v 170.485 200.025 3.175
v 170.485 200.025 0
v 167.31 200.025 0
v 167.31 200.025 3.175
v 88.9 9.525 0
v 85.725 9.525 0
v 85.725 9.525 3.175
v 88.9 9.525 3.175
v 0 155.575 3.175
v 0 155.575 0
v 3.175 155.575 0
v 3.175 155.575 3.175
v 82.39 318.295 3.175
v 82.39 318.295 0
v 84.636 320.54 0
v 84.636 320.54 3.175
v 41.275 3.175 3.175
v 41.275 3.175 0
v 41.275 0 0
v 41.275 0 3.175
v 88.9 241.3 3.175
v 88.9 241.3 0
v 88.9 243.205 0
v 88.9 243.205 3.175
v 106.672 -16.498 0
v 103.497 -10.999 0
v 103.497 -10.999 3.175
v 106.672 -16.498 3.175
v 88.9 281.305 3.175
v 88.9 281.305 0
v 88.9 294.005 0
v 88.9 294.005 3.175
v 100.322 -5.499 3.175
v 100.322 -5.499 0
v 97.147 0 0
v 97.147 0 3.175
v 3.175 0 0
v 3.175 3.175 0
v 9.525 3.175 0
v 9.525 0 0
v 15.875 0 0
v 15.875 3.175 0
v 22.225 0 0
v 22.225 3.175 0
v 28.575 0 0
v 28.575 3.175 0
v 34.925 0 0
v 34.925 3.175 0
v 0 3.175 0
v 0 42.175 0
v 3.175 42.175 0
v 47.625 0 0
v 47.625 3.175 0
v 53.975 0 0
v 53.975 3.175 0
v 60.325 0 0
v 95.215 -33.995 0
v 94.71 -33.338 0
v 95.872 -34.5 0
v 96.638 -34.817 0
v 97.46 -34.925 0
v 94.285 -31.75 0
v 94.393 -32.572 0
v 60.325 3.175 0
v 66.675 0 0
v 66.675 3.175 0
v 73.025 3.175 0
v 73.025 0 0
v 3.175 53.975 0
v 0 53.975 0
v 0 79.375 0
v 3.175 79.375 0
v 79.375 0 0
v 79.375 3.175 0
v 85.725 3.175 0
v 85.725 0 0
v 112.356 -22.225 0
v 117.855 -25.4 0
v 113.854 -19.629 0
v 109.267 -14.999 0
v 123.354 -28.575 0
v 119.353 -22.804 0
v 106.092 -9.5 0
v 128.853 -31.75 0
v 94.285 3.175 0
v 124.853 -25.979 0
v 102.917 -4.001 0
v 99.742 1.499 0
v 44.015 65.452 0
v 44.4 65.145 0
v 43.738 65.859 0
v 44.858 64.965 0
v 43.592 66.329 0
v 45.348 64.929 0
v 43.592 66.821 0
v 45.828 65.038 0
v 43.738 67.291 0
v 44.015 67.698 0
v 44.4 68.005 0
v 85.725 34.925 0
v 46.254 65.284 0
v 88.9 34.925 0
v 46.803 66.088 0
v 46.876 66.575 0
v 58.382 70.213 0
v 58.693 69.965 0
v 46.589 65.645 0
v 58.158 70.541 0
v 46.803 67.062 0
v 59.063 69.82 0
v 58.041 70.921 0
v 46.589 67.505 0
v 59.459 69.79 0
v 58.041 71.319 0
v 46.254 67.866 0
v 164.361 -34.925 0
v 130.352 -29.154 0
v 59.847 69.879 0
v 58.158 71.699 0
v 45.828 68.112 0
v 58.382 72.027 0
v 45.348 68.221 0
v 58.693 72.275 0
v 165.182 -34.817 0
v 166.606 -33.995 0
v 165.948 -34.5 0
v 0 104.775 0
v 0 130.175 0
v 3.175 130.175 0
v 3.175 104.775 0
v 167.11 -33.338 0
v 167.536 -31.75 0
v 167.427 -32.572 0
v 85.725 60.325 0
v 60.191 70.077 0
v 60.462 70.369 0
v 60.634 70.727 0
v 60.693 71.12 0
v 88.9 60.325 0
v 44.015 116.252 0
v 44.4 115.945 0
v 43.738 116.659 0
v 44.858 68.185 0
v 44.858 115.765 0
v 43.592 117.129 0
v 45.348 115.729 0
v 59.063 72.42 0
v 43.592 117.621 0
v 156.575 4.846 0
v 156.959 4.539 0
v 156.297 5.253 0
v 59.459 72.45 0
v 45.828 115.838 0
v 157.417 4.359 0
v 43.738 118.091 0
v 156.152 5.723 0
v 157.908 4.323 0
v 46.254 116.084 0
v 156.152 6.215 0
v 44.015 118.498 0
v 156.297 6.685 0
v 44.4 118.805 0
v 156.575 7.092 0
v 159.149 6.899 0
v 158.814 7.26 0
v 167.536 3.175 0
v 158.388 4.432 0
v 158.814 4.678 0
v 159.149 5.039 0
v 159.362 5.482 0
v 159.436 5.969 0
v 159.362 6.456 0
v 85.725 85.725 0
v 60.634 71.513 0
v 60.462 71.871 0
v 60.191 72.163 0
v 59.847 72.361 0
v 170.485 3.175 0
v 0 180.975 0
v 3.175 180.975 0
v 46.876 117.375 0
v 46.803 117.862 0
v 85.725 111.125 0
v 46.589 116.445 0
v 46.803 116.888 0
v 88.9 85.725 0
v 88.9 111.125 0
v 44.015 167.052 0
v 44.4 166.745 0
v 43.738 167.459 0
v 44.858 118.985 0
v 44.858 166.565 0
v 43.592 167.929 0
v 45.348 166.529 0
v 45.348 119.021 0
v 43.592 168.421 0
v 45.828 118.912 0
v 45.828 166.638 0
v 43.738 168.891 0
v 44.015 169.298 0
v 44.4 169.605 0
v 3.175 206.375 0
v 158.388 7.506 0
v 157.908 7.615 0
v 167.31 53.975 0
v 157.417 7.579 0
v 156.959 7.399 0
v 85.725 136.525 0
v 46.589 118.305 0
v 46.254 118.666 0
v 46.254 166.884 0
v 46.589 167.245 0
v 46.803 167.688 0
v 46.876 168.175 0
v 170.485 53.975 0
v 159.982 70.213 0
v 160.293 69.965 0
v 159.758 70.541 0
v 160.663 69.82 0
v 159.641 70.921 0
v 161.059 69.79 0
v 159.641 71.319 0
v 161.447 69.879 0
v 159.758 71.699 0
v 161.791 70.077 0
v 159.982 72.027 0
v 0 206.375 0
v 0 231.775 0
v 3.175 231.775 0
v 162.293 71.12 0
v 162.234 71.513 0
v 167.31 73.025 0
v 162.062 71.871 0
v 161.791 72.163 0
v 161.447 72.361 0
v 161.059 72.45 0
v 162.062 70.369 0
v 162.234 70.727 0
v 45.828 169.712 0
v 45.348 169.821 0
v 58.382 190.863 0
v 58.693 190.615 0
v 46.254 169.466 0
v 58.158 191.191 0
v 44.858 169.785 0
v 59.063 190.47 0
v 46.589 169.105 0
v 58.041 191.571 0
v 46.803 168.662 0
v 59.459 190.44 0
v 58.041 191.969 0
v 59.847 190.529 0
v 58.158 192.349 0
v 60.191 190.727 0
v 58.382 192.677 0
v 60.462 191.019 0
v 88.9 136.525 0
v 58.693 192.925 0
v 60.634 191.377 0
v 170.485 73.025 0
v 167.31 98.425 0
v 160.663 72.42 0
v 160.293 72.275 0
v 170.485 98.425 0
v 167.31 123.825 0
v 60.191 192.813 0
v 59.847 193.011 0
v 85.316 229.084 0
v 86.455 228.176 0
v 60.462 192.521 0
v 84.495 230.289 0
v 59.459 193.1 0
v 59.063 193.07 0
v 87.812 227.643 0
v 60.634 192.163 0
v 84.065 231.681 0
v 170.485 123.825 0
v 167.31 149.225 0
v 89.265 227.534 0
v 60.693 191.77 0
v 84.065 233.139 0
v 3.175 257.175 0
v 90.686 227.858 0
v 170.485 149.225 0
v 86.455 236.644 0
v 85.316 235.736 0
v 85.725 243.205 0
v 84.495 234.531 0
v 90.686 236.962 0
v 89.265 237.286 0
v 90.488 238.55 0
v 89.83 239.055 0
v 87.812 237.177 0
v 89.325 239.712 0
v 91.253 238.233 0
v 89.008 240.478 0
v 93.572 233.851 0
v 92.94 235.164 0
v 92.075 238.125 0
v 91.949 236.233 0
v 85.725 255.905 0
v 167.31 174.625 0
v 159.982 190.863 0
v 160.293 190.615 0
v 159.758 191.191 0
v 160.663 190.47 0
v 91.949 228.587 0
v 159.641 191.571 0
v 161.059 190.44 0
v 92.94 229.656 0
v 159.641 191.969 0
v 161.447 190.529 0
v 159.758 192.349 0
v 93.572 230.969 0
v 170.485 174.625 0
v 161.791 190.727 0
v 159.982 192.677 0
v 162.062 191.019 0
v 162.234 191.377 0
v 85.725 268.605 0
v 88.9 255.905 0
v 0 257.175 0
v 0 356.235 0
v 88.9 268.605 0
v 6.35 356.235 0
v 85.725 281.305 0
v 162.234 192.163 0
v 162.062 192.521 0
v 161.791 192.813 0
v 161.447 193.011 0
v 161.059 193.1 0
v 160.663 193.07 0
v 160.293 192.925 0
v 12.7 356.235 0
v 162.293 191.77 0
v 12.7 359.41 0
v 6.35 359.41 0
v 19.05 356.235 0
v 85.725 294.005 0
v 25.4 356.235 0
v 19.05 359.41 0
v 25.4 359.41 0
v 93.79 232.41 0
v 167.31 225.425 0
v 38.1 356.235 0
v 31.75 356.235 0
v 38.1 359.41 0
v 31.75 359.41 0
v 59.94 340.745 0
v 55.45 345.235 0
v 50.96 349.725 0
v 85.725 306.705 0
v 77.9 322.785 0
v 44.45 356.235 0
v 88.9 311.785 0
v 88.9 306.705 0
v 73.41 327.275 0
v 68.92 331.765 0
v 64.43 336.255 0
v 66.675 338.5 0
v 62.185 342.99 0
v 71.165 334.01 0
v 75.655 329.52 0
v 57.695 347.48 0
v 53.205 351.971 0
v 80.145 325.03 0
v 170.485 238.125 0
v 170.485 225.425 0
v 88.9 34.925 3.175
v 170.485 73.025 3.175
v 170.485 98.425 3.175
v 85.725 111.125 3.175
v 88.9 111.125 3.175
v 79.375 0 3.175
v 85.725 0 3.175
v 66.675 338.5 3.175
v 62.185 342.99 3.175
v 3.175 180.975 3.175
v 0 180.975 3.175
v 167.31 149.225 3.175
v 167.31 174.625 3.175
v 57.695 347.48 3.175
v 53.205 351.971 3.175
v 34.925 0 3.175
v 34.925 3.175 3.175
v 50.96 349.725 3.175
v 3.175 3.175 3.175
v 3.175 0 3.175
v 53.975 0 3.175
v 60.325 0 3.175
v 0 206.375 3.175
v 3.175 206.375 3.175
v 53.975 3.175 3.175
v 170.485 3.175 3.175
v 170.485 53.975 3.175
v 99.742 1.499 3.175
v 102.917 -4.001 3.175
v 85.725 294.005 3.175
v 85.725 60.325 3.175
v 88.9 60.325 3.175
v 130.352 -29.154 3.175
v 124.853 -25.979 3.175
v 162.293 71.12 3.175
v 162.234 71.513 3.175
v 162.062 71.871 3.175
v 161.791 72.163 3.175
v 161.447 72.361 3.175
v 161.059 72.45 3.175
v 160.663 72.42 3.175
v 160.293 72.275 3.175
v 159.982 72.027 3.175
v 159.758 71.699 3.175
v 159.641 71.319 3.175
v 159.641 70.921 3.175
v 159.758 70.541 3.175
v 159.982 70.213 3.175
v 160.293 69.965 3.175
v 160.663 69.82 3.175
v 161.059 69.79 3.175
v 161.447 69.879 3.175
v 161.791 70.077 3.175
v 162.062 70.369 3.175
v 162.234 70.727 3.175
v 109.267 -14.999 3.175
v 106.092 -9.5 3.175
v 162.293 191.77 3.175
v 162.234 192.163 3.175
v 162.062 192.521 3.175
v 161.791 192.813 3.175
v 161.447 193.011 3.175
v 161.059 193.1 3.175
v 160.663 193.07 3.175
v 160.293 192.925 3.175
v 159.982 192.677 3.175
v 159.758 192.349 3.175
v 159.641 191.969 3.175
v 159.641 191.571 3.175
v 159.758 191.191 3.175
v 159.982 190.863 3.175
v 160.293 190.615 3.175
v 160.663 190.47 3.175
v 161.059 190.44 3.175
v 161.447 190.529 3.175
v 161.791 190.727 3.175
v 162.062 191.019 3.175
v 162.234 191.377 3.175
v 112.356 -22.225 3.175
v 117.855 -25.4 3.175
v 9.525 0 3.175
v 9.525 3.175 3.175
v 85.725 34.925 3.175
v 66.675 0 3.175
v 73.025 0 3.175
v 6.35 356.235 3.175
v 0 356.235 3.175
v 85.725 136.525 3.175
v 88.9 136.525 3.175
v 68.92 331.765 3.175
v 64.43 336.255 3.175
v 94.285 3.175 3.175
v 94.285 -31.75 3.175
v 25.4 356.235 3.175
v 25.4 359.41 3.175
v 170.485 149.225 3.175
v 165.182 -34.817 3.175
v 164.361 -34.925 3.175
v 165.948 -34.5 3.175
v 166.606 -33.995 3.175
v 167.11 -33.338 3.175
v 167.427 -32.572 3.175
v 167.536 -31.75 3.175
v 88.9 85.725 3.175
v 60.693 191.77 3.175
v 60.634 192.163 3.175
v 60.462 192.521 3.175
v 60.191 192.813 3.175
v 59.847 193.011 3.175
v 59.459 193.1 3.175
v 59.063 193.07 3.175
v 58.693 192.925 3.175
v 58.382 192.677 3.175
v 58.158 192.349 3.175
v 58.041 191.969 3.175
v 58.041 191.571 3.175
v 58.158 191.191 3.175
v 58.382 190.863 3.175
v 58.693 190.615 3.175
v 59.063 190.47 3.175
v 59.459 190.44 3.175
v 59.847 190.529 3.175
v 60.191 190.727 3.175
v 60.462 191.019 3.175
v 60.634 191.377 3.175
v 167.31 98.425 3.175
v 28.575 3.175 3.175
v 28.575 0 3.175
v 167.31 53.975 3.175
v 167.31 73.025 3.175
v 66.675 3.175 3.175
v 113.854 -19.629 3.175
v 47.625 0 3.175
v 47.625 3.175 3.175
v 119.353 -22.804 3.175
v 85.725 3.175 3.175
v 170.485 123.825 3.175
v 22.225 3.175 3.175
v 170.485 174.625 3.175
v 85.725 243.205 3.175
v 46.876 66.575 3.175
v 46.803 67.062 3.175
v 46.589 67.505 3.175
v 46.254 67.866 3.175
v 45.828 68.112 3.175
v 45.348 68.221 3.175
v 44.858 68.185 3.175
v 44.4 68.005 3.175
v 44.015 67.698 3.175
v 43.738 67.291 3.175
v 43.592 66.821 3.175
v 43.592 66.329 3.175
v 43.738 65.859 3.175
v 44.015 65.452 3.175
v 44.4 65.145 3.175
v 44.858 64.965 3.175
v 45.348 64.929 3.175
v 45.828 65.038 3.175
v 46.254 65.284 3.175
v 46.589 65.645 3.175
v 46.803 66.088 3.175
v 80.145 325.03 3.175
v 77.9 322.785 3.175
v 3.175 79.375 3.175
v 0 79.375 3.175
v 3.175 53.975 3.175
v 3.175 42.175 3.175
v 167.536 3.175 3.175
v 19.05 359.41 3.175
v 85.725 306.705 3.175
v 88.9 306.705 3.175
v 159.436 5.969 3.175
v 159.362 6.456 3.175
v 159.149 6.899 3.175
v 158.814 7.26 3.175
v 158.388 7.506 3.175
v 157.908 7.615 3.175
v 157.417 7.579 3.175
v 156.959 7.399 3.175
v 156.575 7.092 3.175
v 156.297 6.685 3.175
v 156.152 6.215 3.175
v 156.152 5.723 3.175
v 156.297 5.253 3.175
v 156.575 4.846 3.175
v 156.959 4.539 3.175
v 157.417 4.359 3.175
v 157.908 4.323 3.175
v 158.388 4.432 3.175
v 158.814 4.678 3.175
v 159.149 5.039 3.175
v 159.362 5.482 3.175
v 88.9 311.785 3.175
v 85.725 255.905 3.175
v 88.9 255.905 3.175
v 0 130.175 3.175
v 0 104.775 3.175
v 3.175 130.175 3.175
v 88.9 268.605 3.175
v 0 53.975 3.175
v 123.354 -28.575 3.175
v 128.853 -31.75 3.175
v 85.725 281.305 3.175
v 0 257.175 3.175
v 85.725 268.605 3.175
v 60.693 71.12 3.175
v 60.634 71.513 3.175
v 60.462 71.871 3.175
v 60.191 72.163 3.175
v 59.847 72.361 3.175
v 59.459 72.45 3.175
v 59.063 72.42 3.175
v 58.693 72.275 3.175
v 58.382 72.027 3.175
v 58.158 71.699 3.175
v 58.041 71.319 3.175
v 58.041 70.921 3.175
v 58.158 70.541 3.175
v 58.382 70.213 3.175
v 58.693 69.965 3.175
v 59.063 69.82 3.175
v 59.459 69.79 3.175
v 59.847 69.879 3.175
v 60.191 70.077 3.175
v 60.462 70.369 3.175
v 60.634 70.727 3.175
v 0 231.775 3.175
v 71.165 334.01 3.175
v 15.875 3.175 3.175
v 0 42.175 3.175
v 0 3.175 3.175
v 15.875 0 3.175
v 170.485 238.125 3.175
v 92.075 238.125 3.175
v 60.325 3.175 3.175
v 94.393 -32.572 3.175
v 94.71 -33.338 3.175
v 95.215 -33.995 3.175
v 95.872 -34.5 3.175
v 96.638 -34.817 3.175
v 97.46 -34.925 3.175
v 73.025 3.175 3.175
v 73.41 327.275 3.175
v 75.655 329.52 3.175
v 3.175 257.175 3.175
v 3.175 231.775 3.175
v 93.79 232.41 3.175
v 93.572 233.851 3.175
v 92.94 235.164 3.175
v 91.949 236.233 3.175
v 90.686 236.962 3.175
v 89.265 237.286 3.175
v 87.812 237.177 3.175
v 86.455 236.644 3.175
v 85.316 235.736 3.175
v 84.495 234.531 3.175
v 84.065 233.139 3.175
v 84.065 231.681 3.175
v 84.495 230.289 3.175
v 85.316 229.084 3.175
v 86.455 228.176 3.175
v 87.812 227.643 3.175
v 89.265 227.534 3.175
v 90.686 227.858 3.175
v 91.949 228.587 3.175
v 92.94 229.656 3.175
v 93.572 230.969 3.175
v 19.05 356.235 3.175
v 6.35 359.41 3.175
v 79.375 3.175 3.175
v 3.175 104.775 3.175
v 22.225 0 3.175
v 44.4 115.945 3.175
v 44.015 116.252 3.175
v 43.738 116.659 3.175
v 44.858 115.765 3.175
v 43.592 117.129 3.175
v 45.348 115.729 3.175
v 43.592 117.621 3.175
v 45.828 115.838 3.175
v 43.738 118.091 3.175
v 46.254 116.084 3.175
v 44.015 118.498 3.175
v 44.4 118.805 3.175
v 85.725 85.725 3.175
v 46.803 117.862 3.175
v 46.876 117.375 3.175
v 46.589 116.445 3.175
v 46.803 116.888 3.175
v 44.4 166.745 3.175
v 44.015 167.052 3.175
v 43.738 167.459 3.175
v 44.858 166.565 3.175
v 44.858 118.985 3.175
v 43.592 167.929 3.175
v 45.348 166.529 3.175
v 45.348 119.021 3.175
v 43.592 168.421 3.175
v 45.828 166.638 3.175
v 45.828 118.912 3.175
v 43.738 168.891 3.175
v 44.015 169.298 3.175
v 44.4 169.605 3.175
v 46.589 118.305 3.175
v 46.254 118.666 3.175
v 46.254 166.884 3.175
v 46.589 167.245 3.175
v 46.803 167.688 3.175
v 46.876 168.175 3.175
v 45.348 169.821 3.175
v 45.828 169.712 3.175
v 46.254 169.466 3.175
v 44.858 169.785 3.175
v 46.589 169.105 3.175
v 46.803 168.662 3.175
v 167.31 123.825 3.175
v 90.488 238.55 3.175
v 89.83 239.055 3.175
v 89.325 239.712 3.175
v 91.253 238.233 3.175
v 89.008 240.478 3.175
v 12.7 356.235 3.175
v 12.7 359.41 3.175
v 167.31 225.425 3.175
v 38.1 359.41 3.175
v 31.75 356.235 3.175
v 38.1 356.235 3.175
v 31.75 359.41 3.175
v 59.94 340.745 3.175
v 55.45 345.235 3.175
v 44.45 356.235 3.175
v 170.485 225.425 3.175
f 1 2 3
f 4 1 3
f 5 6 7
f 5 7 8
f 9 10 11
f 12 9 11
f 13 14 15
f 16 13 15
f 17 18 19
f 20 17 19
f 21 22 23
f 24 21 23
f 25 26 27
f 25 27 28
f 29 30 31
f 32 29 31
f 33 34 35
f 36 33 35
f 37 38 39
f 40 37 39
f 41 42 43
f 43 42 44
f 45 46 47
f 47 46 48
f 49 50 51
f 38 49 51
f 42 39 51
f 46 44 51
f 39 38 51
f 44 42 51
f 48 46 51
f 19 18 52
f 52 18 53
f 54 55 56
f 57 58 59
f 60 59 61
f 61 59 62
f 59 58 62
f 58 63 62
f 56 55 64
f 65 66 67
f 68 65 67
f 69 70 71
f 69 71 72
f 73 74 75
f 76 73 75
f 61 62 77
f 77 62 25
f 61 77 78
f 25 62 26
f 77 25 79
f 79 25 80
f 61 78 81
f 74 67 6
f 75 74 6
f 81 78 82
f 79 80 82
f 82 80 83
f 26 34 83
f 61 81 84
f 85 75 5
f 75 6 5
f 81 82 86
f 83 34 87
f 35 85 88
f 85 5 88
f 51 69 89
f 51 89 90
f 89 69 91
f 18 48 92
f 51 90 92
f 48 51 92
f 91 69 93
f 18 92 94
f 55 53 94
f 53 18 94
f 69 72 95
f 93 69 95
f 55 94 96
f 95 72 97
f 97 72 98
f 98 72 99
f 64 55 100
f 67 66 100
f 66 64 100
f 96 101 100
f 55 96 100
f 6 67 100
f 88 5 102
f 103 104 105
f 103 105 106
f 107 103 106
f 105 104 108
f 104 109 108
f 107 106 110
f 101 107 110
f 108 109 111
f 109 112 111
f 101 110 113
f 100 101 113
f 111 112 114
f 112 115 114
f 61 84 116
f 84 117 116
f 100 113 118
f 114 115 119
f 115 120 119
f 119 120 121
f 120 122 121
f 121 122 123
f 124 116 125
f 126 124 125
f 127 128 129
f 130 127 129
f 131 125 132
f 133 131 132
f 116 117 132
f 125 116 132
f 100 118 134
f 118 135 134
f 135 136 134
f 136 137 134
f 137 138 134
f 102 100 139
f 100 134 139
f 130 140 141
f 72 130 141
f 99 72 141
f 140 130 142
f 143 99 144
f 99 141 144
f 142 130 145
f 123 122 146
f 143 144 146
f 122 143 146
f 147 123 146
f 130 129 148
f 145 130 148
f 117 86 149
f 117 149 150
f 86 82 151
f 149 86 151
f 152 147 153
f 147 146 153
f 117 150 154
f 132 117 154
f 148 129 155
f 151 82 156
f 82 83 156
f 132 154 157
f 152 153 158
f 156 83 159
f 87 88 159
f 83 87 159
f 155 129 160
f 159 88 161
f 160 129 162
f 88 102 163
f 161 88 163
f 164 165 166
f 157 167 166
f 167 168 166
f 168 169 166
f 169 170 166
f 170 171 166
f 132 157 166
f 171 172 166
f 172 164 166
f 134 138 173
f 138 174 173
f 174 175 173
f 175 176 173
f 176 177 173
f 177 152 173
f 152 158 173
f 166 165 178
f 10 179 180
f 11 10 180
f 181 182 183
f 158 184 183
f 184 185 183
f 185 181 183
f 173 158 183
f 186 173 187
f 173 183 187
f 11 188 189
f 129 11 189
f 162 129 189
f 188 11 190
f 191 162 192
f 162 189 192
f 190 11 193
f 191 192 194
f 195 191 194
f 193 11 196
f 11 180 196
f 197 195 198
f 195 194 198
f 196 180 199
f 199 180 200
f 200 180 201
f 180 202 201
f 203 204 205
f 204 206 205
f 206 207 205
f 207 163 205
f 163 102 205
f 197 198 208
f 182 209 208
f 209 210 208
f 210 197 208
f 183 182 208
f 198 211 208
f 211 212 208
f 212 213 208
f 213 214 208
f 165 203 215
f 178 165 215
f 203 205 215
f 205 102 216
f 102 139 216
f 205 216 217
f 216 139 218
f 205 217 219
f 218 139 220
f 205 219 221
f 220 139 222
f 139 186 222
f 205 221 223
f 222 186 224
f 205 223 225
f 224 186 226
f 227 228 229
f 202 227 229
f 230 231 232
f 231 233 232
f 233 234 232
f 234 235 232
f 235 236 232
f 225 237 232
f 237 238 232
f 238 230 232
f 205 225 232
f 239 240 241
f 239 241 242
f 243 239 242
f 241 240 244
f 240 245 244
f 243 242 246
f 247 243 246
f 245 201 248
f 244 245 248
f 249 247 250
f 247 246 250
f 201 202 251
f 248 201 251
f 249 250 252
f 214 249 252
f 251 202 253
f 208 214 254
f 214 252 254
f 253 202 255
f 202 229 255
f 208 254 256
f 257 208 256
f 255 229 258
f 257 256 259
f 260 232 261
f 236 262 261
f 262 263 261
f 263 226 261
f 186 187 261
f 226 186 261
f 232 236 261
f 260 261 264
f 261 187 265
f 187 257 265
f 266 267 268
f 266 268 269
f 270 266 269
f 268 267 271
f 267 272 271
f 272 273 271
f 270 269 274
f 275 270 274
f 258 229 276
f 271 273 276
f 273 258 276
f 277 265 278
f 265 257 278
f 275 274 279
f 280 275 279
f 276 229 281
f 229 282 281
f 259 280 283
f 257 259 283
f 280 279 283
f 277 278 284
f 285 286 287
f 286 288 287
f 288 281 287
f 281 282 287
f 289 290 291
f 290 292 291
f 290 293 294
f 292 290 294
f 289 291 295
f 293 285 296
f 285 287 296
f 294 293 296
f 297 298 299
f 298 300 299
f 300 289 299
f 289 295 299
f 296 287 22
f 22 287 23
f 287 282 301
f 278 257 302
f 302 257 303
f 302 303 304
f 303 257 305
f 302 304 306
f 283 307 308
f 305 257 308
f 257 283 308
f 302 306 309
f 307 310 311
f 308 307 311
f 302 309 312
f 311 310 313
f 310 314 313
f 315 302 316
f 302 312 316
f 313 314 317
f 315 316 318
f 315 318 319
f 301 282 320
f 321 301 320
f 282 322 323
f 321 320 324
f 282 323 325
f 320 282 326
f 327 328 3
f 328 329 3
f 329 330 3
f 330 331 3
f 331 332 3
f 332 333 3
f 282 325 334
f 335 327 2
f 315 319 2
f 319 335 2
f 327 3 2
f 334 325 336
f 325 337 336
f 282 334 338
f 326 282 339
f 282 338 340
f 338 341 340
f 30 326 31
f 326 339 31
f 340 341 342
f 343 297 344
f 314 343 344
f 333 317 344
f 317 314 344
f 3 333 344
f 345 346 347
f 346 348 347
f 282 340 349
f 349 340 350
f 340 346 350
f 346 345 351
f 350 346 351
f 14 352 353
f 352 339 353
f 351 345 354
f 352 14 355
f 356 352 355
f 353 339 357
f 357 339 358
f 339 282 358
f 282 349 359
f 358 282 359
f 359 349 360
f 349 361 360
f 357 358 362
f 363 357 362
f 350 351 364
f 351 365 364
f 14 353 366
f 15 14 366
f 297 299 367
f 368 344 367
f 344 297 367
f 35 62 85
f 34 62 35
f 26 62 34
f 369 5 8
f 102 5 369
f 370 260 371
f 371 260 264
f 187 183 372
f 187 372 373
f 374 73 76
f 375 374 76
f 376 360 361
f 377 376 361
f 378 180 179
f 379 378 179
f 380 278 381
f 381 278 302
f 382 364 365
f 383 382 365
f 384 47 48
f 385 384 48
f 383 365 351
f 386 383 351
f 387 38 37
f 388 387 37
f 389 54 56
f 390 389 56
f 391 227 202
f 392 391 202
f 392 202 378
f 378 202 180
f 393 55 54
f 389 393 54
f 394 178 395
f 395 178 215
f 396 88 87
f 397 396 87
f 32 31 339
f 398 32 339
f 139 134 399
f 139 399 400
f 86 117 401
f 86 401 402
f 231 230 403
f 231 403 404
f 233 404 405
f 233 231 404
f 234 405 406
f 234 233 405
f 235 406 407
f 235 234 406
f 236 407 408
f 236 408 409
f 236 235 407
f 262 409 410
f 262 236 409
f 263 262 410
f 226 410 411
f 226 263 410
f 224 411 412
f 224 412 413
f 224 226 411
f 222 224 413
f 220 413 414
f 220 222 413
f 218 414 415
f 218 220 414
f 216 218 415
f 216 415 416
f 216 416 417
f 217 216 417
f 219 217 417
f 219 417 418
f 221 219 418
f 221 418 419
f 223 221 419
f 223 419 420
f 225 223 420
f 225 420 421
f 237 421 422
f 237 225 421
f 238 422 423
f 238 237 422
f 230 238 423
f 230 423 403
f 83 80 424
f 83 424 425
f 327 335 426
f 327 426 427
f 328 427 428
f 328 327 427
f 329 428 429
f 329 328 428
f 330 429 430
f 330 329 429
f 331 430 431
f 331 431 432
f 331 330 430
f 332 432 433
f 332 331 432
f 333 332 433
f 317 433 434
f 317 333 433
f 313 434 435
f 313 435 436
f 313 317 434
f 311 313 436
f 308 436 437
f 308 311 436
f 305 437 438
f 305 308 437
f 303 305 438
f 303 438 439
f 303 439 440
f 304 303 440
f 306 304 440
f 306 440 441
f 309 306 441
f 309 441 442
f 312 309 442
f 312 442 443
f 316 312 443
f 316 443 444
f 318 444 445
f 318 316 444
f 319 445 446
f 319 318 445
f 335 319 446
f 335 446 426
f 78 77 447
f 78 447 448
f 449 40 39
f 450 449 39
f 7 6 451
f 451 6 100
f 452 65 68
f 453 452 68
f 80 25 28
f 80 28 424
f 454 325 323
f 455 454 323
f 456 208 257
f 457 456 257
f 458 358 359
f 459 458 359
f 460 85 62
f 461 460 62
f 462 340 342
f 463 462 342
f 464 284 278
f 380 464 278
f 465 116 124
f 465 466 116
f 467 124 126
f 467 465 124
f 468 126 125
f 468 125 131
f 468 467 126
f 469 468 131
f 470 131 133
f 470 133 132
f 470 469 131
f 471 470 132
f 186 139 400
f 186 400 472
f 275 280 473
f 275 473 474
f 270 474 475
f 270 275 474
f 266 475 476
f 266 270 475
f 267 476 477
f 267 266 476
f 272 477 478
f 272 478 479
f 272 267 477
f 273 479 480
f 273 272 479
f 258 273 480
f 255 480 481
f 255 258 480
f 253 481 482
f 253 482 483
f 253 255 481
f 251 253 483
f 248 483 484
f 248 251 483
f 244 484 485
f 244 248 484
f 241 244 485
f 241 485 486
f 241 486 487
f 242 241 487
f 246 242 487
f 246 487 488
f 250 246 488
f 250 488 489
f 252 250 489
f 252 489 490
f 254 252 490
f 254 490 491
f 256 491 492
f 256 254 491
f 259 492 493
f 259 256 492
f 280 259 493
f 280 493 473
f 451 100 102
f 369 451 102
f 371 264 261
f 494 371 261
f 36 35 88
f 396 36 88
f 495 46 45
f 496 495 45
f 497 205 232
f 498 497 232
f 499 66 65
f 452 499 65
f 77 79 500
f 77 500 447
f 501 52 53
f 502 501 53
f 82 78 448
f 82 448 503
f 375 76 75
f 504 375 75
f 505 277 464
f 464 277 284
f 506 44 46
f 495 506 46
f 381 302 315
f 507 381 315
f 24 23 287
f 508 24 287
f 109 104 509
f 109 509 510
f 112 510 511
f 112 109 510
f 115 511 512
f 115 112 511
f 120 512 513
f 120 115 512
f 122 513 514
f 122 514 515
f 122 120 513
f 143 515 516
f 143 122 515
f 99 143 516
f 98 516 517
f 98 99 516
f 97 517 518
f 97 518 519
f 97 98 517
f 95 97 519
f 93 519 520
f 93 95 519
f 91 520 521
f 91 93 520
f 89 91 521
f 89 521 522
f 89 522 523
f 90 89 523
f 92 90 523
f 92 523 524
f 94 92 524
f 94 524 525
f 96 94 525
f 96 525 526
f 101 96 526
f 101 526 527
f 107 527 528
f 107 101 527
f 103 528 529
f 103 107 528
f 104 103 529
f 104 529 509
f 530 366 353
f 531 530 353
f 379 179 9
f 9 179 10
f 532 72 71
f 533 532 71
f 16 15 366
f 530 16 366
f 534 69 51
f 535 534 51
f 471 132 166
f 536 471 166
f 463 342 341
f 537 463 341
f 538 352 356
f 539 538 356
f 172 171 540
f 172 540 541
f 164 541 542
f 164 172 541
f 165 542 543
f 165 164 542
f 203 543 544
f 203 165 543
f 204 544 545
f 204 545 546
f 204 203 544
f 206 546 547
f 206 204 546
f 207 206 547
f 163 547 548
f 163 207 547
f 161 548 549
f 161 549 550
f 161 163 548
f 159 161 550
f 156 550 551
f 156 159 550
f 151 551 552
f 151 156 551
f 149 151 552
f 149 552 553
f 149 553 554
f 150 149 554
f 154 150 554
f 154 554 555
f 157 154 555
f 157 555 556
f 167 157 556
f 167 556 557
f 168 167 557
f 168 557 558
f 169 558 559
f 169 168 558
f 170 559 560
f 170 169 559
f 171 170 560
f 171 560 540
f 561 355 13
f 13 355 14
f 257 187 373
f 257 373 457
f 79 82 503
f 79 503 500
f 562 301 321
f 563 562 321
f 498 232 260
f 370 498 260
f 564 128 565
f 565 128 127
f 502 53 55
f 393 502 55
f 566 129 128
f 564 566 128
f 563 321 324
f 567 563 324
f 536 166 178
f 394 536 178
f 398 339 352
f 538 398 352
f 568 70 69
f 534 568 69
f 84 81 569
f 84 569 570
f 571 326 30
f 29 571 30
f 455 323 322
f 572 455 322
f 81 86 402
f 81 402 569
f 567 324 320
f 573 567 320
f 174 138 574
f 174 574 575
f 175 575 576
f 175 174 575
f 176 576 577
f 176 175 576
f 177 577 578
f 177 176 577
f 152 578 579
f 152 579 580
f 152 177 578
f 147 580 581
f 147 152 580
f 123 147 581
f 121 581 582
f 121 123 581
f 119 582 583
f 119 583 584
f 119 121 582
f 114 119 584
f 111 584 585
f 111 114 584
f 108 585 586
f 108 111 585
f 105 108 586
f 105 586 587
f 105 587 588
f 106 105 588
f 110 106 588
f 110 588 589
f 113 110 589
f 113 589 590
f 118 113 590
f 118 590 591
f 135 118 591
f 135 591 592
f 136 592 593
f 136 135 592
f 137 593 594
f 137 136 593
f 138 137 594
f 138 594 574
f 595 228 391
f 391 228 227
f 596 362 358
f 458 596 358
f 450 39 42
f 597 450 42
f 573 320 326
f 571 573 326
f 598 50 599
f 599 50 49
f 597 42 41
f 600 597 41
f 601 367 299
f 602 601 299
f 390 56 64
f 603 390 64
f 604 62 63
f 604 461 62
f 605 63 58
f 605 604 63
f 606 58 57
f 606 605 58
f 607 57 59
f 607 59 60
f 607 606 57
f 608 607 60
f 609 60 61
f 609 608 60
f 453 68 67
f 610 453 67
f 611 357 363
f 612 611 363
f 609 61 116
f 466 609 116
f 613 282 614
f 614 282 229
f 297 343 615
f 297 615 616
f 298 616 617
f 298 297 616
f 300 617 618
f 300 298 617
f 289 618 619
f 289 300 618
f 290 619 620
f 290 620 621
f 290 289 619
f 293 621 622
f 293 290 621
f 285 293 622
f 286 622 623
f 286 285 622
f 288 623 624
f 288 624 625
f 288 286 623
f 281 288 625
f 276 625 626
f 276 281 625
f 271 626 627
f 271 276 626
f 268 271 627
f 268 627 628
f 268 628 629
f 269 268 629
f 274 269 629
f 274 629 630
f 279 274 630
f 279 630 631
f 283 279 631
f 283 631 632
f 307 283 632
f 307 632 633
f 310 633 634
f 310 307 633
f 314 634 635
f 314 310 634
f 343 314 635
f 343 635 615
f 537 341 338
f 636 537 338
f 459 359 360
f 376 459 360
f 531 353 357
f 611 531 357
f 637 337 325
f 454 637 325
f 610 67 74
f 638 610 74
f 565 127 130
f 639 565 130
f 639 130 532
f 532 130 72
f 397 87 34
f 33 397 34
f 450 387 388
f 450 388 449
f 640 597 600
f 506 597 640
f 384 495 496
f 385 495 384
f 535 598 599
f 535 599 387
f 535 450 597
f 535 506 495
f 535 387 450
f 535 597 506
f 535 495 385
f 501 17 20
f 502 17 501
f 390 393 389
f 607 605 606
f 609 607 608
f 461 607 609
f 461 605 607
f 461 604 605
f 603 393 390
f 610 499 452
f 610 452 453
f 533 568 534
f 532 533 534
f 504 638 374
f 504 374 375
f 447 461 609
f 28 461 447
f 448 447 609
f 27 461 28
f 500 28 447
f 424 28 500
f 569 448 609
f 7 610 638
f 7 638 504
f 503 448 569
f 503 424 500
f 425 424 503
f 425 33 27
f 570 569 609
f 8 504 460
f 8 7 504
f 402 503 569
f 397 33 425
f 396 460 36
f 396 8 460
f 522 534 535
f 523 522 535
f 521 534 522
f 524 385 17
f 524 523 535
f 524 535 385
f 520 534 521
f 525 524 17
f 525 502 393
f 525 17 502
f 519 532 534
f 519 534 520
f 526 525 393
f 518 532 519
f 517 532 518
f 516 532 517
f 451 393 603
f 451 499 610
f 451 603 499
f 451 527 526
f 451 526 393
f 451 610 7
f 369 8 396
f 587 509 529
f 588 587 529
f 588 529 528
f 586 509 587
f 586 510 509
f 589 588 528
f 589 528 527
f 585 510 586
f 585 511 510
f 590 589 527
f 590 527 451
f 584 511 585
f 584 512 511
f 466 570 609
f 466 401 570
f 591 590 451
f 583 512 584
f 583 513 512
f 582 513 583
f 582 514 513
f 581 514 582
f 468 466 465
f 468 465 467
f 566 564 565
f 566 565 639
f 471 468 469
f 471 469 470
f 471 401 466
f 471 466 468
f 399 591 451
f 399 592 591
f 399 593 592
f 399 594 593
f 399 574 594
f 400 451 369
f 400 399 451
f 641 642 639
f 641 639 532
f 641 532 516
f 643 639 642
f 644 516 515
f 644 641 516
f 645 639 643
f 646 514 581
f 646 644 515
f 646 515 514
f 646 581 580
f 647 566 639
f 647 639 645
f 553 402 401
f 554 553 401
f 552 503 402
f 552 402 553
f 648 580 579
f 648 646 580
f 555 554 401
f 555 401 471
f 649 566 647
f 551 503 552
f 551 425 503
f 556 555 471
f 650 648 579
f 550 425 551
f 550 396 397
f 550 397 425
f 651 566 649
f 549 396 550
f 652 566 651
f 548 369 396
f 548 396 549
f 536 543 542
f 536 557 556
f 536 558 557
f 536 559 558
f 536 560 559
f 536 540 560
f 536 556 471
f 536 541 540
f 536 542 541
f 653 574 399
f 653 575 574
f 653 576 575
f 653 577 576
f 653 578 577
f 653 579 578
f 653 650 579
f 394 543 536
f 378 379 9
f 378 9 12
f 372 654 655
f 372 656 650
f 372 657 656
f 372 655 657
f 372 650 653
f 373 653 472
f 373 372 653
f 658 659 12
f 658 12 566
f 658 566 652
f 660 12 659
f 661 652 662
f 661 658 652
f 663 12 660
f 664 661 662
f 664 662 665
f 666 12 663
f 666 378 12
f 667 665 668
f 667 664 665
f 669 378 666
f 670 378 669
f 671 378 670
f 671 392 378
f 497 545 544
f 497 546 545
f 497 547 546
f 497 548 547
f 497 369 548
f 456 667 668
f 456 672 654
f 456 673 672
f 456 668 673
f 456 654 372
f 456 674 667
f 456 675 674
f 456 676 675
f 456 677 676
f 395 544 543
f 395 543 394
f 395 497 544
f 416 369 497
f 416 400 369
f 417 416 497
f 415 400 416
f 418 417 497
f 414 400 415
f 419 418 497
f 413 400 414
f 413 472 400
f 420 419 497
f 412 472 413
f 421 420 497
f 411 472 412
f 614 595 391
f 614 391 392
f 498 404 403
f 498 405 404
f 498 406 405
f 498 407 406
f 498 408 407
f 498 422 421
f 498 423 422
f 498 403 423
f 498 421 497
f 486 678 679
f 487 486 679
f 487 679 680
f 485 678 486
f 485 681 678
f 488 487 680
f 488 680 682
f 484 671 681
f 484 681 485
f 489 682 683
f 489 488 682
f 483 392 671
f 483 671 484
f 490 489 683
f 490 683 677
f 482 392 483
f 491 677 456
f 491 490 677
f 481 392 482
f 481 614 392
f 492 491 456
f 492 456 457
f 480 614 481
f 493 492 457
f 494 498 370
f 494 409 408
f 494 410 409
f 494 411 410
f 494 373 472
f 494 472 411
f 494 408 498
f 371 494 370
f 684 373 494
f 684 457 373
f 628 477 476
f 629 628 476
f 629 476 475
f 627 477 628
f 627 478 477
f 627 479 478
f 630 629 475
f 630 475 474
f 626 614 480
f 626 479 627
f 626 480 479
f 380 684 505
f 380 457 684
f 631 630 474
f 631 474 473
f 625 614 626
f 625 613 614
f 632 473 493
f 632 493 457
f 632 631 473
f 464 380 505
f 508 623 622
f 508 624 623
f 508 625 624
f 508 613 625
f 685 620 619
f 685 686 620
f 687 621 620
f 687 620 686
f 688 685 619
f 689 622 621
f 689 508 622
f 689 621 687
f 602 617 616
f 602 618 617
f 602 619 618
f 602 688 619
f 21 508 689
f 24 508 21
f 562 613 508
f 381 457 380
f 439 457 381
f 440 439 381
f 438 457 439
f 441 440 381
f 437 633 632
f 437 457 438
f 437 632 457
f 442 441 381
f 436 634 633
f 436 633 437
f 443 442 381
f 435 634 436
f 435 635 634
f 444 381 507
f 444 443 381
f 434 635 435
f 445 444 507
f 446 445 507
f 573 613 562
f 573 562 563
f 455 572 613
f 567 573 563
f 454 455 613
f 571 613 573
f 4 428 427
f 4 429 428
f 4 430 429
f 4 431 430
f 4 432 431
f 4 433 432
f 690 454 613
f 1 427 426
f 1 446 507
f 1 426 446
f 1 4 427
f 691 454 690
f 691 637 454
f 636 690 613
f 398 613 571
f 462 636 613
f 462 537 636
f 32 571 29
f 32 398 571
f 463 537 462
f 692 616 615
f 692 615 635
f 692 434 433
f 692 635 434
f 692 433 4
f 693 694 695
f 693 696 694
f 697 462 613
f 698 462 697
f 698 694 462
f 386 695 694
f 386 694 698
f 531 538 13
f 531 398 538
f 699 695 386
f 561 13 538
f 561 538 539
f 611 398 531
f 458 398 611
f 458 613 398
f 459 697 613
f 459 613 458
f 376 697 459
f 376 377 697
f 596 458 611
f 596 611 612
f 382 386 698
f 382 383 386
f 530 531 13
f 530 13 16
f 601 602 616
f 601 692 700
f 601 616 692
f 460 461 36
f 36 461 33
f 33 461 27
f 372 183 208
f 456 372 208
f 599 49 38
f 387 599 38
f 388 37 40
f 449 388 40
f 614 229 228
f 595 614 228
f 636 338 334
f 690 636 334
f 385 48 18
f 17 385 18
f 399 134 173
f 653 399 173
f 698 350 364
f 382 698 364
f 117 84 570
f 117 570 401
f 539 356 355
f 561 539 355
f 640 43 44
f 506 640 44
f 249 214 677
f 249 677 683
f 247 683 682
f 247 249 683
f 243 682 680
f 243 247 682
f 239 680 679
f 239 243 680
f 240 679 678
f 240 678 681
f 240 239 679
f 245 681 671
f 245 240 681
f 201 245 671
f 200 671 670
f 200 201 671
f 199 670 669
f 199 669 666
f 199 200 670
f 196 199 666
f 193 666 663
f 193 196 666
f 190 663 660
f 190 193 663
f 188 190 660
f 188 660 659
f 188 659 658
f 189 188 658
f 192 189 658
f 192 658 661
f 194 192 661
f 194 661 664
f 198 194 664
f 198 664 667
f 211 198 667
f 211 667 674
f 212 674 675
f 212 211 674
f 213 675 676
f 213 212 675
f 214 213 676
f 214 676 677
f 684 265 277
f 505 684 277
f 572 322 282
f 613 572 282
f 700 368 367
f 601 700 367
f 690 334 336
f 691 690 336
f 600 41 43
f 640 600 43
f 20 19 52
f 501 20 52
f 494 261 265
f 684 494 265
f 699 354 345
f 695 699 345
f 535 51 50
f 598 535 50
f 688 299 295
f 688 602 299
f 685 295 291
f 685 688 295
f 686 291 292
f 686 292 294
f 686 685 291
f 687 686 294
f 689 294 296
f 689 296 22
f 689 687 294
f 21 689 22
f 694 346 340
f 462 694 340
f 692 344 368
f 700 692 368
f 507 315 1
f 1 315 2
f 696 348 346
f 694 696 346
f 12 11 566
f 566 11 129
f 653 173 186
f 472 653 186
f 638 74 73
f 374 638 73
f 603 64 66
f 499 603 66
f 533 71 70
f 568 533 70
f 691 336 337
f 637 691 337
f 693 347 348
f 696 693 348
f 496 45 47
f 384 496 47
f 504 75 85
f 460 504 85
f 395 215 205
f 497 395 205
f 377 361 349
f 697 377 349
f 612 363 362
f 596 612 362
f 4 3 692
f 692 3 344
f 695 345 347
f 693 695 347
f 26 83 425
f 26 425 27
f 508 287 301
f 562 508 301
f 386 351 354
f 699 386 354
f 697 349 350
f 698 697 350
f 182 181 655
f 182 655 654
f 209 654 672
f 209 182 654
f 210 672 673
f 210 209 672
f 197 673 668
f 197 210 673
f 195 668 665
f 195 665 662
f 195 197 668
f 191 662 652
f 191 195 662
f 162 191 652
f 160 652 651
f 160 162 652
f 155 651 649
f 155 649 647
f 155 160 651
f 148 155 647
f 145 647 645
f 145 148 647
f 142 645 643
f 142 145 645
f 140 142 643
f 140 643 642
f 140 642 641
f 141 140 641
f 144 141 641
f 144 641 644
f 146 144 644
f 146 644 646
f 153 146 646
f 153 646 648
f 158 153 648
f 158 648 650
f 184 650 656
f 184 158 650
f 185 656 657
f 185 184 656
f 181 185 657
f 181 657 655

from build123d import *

# Parameters (mm, degrees)
SKETCH1_R           = 4.8895
SKETCH1_R_2         = 1.3335
SKETCH1_R_3         = 1.651
SKETCH1_W           = 3.175
SKETCH1_H           = 25.4
BOSS_EXTRUDE2_DEPTH = 3.175
FILLET1_R           = 3.175


with BuildPart() as part:
    # Sketch1 → Boss-Extrude2 (new body)
    with BuildSketch(Plane.XY):
        Polygon((0, 3.175), (3.175, 3.175), (3.175, 0), (9.525, 0), (9.525, 3.175), (15.875, 3.175), (15.875, 0), (22.225, 0), (22.225, 3.175), (28.575, 3.175), (28.575, 0), (34.925, 0), (34.925, 3.175), (41.275, 3.175), (41.275, 0), (47.625, 0), (47.625, 3.175), (53.975, 3.175), (53.975, 0), (60.325, 0), (60.325, 3.175), (66.675, 3.175), (66.675, 0), (73.025, 0), (73.025, 3.175), (79.375, 3.175), (79.375, 0), (85.725, 0), (85.725, 3.175), (88.9, 3.175), (94.2848, 3.175), (94.2848, -34.925), (167.535593046, -34.925), (167.535593046, 3.175), (170.4848, 3.175), (170.4848, 53.975), (167.3098, 53.975), (167.3098, 73.025), (170.4848, 73.025), (170.4848, 98.425), (167.3098, 98.425), (167.3098, 123.825), (170.4848, 123.825), (170.4848, 149.225), (167.3098, 149.225), (167.3098, 174.625), (170.4848, 174.625), (170.4848, 200.025), (167.3098, 200.025), (167.3098, 225.425), (170.4848, 225.425), (170.4848, 238.125), (88.9, 238.125), (88.9, 243.205), (85.725, 243.205), (85.725, 255.905), (88.9, 255.905), (88.9, 268.605), (85.725, 268.605), (85.725, 281.305), (88.9, 281.305), (88.9, 294.005), (85.725, 294.005), (85.725, 306.705), (88.9, 306.705), (88.9, 311.785), (82.390448212, 318.294551788), (84.635512242, 320.539615818), (80.145384182, 325.029743879), (77.900320151, 322.784679849), (73.410192091, 327.274807909), (75.655256121, 329.519871939), (71.165128061, 334.01), (68.92006403, 331.76493597), (64.42993597, 336.25506403), (66.675, 338.500128061), (62.184871939, 342.990256121), (59.939807909, 340.745192091), (55.449679849, 345.235320151), (57.694743879, 347.480384182), (53.204615818, 351.970512242), (50.959551788, 349.725448212), (44.45, 356.235), (38.1, 356.235), (38.1, 359.41), (31.75, 359.41), (31.75, 356.235), (25.4, 356.235), (25.4, 359.41), (19.05, 359.41), (19.05, 356.235), (12.7, 356.235), (12.7, 359.41), (6.35, 359.41), (6.35, 356.235), (0, 356.235), (0, 257.175), (3.175, 257.175), (3.175, 231.775), (0, 231.775), (0, 206.375), (3.175, 206.375), (3.175, 180.975), (0, 180.975), (0, 155.575), (3.175, 155.575), (3.175, 130.175), (0, 130.175), (0, 104.775), (3.175, 104.775), (3.175, 79.375), (0, 79.375), (0, 53.975), (3.175, 53.975), (3.175, 42.175), (0, 42.175), (0, 28.575), align=None)
        with Locations((88.9, 232.41)):
            Circle(SKETCH1_R, mode=Mode.SUBTRACT)
        with Locations((59.3598, 191.77)):
            Circle(SKETCH1_R_2, mode=Mode.SUBTRACT)
        with Locations((59.3598, 71.12)):
            Circle(SKETCH1_R_2, mode=Mode.SUBTRACT)
        with Locations((160.9598, 71.12)):
            Circle(SKETCH1_R_2, mode=Mode.SUBTRACT)
        with Locations((160.9598, 191.77)):
            Circle(SKETCH1_R_2, mode=Mode.SUBTRACT)
        with Locations((45.225, 66.574999946)):
            Circle(SKETCH1_R_3, mode=Mode.SUBTRACT)
        with Locations((45.225, 117.374999946)):
            Circle(SKETCH1_R_3, mode=Mode.SUBTRACT)
        with Locations((45.225, 168.174999946)):
            Circle(SKETCH1_R_3, mode=Mode.SUBTRACT)
        with Locations((157.7848, 5.969)):
            Circle(SKETCH1_R_3, mode=Mode.SUBTRACT)
        with Locations((87.3125, 123.825)):
            Rectangle(SKETCH1_W, SKETCH1_H, mode=Mode.SUBTRACT)
        Polygon((99.742302456, 1.4986), (102.917302456, -4.000661314), (100.321651116, -5.499261314), (97.146651116, 0), align=None, mode=Mode.SUBTRACT)
        with Locations((87.3125, 73.025)):
            Rectangle(SKETCH1_W, SKETCH1_H, mode=Mode.SUBTRACT)
        with Locations((87.3125, 22.225)):
            Rectangle(SKETCH1_W, SKETCH1_H, mode=Mode.SUBTRACT)
        Polygon((106.092302456, -9.499922628), (103.496651116, -10.998522628), (106.671651116, -16.497783942), (109.267302456, -14.999183942), align=None, mode=Mode.SUBTRACT)
        Polygon((113.854167186, -19.62934866), (112.355567186, -22.225), (117.8548285, -25.4), (119.3534285, -22.80434866), align=None, mode=Mode.SUBTRACT)
        Polygon((124.852689814, -25.97934866), (123.354089814, -28.575), (128.853351128, -31.75), (130.351951128, -29.15434866), align=None, mode=Mode.SUBTRACT)
    extrude(amount=BOSS_EXTRUDE2_DEPTH)

    # Fillet1
    fillet1_edges = [part.edges().sort_by_distance(p)[0] for p in [
        (88.9, 238.125, 1.5875),
        (167.535593046, -34.925, 1.5875),
        (94.2848, -34.925, 1.5875),
    ]]
    fillet(fillet1_edges, radius=FILLET1_R)


solid = part.part
